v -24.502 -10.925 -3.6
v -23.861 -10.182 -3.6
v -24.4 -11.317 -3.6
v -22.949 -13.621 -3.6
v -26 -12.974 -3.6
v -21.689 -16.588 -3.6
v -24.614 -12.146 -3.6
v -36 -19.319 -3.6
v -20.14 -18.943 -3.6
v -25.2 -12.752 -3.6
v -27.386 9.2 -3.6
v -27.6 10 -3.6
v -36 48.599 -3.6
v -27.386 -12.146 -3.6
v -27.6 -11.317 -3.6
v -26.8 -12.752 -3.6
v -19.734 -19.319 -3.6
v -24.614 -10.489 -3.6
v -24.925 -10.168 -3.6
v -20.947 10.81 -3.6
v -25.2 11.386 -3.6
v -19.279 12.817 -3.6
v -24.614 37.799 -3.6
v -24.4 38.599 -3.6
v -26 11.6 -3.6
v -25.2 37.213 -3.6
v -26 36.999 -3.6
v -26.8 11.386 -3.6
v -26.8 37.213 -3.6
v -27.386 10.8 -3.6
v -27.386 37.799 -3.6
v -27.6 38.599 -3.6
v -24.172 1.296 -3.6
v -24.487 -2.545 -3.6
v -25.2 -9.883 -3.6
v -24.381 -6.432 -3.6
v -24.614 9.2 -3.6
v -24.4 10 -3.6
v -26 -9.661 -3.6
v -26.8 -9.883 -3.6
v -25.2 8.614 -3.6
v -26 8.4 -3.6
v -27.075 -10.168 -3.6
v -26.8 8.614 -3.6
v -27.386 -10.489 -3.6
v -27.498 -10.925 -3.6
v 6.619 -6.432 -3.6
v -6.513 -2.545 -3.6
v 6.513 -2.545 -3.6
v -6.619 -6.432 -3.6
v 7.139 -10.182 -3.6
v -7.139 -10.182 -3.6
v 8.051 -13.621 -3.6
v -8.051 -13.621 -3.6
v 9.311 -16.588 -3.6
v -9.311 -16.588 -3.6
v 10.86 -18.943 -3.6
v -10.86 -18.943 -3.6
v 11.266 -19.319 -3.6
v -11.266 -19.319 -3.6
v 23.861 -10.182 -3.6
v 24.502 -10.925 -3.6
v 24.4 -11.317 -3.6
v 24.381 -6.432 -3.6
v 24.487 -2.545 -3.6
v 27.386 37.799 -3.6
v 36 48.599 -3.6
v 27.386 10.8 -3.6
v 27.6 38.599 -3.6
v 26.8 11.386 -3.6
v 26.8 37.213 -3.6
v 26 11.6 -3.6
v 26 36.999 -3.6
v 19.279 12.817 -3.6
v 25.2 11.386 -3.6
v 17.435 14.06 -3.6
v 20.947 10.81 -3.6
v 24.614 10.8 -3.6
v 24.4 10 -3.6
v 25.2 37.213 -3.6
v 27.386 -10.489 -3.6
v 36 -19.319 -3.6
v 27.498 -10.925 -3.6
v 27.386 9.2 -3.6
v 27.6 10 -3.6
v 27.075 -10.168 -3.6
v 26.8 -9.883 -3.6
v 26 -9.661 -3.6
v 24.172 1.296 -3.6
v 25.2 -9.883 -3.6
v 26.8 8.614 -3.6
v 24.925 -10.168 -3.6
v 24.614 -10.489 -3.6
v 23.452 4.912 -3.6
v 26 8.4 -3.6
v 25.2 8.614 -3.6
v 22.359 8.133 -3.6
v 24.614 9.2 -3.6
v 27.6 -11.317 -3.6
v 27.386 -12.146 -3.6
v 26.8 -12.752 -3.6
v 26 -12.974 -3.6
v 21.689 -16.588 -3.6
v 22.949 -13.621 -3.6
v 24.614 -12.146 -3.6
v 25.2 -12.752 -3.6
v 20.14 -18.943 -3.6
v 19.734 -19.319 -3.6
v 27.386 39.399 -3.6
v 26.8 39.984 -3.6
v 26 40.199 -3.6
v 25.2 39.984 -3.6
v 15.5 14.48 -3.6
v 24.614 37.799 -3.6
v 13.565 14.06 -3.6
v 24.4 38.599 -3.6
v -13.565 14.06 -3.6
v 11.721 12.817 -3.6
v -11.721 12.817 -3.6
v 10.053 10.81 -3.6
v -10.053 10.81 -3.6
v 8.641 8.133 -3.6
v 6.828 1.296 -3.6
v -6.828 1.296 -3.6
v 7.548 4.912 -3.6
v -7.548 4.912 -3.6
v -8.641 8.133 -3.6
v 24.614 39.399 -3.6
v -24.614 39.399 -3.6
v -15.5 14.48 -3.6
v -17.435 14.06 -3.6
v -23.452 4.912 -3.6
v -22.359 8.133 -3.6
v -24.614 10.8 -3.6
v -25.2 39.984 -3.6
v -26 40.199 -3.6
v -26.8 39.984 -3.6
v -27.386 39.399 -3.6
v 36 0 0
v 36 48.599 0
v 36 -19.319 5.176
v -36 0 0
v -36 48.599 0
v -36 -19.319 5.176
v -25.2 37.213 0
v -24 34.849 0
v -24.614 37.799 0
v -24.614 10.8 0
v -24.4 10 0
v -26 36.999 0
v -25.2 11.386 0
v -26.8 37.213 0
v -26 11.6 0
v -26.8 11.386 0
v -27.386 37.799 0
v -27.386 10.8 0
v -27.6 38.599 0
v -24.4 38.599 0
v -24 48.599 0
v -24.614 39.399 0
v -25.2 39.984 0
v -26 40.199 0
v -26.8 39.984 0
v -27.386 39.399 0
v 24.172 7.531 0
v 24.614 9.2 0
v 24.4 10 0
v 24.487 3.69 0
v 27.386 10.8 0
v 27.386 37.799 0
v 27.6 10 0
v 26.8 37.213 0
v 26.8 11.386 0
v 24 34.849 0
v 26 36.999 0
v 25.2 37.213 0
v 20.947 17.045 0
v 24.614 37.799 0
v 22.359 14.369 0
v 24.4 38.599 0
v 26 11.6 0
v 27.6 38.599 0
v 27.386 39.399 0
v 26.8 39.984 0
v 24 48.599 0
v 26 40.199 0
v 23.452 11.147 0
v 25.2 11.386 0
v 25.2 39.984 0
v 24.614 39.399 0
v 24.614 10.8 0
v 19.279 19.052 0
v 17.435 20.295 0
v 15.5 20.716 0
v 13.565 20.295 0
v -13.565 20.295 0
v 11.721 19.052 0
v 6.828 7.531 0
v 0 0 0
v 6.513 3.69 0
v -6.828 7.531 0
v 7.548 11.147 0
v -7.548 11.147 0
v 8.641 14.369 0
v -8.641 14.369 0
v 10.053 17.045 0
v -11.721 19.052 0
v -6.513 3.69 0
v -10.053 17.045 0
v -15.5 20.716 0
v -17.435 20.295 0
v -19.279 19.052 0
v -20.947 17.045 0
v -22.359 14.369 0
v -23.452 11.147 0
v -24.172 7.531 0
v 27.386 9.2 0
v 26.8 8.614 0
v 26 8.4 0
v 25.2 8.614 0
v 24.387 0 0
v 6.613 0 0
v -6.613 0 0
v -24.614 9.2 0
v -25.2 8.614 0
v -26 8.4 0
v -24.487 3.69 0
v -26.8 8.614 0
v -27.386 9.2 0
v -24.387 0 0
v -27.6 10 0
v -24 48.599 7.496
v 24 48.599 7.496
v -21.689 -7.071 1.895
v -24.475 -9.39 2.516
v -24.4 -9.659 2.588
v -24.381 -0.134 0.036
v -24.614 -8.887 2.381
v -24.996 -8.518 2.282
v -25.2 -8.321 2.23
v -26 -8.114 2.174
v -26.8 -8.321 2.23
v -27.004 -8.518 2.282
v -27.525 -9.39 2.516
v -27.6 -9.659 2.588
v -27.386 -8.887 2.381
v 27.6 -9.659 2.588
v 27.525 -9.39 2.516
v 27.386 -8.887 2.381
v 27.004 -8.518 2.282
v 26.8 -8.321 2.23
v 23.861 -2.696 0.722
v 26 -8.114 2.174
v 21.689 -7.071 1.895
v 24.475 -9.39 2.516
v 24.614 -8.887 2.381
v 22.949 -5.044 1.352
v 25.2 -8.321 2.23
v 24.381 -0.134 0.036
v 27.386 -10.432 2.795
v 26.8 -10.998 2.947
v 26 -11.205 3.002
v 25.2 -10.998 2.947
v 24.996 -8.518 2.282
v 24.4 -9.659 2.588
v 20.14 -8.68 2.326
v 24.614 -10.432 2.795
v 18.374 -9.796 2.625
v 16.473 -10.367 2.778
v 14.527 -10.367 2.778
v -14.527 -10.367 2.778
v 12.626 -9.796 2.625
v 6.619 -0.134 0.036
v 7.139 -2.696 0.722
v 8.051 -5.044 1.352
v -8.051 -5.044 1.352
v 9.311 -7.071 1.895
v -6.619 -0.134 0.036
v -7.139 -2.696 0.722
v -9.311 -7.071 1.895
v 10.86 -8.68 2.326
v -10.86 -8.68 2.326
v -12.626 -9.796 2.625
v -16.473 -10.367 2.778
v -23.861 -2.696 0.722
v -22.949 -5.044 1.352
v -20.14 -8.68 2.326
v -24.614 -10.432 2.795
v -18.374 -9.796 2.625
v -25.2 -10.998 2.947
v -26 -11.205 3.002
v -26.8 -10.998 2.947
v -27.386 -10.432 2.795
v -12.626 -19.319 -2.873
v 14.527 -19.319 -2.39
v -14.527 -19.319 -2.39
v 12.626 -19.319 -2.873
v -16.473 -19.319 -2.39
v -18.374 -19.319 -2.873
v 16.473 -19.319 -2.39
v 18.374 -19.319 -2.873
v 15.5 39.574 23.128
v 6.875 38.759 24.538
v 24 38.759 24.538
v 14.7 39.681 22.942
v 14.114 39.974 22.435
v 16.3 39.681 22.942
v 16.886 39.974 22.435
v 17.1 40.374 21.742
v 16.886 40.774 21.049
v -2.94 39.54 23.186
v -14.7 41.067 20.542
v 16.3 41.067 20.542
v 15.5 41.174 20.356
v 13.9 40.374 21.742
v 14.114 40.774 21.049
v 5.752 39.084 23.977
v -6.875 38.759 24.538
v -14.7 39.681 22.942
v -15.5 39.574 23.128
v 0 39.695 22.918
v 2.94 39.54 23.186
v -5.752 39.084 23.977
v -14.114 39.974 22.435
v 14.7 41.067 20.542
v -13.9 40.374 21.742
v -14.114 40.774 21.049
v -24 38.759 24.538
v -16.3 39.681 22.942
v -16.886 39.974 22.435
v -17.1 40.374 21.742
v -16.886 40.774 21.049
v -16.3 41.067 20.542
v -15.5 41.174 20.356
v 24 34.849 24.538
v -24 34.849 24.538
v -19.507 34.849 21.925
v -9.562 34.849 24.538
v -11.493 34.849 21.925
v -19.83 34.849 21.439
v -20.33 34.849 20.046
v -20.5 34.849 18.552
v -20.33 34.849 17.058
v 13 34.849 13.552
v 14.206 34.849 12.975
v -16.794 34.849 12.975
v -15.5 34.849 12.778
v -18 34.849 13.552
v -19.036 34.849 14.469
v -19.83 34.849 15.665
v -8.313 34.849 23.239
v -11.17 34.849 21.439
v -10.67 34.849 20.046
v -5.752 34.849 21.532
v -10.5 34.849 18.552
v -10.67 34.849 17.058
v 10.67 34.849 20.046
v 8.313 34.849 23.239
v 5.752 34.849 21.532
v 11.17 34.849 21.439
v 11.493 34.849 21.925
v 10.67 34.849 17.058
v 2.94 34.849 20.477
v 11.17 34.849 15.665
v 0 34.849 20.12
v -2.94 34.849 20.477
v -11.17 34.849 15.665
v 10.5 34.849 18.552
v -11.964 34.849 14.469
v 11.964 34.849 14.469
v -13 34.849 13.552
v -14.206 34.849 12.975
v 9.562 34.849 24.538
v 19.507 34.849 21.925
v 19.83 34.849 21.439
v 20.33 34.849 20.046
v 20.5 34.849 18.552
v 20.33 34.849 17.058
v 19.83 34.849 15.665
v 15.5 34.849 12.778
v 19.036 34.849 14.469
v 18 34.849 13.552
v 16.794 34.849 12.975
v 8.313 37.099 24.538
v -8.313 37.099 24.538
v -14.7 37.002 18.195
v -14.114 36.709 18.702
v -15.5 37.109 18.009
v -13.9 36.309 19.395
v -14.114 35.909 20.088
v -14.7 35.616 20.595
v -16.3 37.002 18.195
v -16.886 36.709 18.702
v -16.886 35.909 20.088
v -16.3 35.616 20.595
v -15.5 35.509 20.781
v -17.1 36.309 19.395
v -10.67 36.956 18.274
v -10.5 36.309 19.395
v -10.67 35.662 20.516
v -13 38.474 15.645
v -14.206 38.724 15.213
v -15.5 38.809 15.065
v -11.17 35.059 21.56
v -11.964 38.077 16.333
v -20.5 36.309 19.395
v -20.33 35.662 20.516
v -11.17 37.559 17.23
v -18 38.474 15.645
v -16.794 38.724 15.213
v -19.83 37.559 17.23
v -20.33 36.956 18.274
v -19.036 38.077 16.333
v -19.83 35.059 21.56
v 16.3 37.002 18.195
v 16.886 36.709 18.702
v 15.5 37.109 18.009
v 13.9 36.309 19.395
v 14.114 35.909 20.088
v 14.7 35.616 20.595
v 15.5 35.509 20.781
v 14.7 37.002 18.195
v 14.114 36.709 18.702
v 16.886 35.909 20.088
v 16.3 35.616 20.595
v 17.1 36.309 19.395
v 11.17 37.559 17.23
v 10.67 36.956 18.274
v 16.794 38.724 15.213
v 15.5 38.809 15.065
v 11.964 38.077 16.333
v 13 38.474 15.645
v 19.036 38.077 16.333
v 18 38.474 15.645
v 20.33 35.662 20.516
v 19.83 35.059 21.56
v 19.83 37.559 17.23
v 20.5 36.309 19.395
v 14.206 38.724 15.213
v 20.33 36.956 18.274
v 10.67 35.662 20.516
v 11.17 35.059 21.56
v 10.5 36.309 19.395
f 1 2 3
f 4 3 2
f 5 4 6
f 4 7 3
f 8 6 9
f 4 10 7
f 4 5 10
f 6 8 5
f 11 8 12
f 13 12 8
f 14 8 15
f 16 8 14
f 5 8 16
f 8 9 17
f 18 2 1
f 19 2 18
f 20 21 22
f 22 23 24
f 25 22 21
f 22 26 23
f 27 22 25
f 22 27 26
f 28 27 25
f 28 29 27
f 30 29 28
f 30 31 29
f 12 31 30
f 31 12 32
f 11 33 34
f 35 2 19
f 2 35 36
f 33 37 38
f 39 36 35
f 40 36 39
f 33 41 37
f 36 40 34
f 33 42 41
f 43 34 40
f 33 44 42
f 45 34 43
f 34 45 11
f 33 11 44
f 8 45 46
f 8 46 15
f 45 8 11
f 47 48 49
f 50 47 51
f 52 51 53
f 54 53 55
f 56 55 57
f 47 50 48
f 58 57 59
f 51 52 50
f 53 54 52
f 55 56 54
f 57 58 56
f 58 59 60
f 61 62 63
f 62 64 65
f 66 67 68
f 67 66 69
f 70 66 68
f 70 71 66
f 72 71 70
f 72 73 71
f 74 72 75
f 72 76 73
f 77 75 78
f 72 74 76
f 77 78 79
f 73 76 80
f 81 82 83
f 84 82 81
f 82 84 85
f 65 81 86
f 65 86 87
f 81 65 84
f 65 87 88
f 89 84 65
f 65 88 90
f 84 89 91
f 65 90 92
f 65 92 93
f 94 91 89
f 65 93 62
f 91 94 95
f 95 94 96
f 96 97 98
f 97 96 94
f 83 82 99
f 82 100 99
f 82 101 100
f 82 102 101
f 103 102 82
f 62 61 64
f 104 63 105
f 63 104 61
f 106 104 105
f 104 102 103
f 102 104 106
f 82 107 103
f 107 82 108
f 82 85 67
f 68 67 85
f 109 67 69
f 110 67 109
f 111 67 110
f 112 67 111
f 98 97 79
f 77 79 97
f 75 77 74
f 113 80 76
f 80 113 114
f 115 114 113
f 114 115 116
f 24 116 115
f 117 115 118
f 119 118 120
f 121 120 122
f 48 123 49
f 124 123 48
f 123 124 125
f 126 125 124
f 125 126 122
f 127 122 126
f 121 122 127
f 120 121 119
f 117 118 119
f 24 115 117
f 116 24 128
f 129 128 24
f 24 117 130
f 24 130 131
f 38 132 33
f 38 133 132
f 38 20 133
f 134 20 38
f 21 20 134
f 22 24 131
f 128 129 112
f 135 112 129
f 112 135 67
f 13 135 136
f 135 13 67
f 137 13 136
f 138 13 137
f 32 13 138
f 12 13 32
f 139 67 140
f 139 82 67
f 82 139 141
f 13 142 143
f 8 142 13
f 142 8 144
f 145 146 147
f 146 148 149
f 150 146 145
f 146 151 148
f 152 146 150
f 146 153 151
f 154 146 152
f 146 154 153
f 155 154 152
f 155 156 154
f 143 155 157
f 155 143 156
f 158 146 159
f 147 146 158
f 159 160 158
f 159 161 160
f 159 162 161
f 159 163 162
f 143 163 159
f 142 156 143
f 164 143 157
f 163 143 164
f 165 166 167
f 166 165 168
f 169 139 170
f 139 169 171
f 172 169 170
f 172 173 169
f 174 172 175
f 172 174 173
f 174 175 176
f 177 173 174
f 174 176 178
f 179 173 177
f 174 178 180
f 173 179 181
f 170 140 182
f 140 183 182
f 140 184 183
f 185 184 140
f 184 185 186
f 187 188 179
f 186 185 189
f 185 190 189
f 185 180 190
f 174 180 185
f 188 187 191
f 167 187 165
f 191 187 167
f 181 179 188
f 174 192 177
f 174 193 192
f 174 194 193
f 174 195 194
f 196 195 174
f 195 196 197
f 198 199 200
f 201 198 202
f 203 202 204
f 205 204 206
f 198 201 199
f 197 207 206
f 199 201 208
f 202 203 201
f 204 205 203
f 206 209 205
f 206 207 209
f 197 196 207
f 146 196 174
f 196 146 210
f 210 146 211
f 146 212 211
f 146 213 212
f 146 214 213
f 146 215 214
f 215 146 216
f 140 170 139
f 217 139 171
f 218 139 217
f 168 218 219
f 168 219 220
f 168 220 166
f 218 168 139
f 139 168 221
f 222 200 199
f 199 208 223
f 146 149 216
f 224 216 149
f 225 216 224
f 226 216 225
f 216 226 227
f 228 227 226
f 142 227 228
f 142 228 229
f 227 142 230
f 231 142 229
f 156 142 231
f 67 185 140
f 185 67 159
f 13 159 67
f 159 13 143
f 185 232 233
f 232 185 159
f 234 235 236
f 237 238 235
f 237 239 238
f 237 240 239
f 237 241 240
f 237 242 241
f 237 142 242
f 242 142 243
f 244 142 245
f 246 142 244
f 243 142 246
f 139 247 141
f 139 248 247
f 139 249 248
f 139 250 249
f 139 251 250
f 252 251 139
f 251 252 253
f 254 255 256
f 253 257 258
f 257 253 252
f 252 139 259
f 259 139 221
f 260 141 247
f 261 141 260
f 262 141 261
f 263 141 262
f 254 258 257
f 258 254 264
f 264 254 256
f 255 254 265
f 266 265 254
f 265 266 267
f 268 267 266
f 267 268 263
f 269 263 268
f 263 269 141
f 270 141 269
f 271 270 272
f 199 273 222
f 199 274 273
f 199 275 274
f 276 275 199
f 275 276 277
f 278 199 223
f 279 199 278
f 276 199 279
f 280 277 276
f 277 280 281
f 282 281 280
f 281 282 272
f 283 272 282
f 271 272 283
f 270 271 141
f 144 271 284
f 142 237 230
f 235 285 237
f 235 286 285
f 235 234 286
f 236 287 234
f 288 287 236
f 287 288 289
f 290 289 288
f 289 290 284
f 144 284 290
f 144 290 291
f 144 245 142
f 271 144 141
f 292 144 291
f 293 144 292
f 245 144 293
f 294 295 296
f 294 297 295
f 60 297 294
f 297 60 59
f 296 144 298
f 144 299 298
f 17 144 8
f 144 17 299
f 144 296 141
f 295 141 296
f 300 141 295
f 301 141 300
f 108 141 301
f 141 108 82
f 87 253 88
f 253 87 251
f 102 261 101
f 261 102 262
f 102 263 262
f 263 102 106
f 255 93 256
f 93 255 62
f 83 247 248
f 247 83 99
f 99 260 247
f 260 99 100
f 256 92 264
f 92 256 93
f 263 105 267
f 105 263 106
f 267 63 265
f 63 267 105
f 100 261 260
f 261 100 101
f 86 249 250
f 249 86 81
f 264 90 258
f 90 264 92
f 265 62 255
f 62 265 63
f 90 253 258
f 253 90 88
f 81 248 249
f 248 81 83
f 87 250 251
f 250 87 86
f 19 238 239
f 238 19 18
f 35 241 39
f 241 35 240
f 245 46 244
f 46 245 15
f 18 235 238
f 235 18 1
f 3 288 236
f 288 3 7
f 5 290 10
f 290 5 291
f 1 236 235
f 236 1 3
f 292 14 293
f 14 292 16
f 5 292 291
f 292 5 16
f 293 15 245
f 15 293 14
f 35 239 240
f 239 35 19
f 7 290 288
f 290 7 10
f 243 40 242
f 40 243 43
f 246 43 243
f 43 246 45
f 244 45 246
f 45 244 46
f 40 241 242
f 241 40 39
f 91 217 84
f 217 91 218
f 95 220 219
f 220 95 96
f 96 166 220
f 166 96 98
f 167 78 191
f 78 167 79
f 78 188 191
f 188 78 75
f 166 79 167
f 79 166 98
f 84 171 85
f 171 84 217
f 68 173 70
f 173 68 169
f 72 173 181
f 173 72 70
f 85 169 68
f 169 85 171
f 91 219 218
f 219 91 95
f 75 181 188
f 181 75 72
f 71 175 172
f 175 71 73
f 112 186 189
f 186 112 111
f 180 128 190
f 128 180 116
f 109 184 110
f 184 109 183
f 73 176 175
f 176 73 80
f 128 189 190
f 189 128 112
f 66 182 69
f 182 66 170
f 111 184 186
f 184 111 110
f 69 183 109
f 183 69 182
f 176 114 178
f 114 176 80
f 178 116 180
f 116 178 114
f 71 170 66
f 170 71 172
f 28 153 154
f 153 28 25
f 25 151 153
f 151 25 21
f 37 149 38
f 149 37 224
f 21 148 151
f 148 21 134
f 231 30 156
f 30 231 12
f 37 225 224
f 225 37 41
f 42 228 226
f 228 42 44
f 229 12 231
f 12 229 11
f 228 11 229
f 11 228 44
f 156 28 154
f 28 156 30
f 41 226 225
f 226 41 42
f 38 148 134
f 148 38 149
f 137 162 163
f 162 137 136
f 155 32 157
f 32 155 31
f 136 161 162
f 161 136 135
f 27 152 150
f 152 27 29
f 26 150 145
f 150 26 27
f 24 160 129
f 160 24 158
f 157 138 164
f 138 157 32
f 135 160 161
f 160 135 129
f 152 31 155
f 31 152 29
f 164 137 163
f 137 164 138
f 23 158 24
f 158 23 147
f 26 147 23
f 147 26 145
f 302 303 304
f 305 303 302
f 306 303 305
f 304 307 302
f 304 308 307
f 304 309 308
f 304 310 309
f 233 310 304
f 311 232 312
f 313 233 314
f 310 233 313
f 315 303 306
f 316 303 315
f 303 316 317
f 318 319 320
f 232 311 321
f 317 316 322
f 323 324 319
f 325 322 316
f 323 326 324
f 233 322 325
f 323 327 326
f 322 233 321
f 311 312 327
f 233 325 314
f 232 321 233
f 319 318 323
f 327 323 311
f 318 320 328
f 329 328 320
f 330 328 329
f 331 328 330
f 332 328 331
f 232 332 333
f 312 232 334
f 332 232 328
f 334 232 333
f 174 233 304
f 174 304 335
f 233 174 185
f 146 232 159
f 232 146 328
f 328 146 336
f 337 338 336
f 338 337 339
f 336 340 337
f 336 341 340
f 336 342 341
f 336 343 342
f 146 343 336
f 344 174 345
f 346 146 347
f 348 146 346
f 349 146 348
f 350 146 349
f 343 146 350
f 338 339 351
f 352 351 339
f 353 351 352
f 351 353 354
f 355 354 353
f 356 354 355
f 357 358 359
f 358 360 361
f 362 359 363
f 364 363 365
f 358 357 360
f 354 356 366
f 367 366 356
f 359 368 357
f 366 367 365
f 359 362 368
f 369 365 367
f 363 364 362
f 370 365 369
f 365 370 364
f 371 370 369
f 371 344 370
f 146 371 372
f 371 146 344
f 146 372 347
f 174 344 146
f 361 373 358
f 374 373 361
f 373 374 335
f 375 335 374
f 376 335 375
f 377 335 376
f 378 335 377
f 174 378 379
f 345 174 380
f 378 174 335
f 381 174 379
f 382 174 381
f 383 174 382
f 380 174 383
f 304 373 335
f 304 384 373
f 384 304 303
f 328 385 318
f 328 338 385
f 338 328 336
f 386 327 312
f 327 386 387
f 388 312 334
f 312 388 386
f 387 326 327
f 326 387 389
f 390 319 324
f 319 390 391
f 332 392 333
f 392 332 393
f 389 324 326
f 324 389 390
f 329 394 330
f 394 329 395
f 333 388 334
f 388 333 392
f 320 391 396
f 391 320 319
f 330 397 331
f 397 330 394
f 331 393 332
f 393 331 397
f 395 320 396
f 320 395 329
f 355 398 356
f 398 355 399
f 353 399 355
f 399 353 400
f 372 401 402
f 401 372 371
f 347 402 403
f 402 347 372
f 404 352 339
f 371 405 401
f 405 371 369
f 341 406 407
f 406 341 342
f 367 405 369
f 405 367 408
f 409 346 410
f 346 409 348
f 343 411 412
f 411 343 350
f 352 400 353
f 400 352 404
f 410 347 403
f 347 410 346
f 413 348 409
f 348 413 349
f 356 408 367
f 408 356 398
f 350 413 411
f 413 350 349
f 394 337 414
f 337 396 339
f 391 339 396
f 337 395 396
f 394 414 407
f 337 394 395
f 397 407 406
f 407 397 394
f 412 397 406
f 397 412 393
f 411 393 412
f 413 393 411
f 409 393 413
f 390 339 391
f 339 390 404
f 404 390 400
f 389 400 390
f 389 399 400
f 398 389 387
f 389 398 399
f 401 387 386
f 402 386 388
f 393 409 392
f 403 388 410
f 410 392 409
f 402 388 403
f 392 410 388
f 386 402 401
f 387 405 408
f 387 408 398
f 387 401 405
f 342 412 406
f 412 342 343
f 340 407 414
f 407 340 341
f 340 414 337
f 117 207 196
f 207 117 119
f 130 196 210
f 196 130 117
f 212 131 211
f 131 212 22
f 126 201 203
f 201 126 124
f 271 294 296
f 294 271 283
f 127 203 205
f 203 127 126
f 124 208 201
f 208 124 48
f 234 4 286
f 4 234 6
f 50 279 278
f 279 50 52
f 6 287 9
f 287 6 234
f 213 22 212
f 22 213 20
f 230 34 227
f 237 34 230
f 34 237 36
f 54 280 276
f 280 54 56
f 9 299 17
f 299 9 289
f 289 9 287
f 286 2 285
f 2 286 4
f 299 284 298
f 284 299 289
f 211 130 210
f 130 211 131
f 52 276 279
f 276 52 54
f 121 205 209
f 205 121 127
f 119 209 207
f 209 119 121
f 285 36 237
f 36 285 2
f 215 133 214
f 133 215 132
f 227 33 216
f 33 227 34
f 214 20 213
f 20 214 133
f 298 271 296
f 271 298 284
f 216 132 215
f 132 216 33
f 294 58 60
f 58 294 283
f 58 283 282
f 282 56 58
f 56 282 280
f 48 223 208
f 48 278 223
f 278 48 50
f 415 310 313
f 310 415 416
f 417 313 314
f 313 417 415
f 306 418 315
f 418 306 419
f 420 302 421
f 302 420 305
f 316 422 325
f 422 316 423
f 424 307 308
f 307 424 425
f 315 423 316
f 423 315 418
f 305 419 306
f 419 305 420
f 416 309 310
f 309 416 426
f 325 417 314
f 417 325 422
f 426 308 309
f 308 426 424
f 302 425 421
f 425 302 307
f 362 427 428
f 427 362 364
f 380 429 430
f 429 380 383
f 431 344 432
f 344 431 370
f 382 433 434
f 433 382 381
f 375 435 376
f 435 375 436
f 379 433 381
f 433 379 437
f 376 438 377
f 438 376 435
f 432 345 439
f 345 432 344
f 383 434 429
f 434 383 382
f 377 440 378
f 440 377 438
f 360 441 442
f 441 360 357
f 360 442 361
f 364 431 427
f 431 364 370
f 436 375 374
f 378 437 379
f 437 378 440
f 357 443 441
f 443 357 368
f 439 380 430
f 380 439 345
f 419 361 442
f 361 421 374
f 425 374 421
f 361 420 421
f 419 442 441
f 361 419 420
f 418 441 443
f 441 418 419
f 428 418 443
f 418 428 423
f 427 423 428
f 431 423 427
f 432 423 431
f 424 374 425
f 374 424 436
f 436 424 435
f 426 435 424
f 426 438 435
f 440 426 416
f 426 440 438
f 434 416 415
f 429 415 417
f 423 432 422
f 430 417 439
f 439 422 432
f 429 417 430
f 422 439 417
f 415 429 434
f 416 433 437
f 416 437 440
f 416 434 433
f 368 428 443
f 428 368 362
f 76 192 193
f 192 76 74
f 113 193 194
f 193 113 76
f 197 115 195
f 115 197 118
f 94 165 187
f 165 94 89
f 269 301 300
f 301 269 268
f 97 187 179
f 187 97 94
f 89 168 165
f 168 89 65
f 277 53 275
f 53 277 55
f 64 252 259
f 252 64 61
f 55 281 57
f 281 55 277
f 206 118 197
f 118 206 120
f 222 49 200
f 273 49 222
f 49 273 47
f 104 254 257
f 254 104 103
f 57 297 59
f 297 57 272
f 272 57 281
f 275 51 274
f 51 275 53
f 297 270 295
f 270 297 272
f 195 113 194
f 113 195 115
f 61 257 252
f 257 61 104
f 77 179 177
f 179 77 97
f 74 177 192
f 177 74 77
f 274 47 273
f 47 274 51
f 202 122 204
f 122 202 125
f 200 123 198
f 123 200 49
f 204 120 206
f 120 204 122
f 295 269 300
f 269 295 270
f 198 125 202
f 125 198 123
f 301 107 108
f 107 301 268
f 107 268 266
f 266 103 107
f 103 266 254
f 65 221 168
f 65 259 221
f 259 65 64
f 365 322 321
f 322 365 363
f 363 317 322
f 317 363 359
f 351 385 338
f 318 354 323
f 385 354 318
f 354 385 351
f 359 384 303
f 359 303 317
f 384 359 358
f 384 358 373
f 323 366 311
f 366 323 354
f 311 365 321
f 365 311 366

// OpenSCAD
// file: libraries/frame_axis_block.scad
// extr=20; h = 3*extr; w = h; diagonal = extr*sqrt(2); thickness=3.6; 
 

module frame_axis_block(h, w, thickness, extr, diagonal) {
  difference() {
    intersection() {
      //rotate([0, 0, -30])
       translate([-extr*sin(15), -extr*cos(15), -h/2], center=false)
	        cube([extr*sin(15)+thickness, w, h]);
      union() {
	      translate([0,-extr*cos(15), -h/2]) 
      //   rotate([0, 0, -30])
	          cube([thickness, w, h]); //main frame plate
	    //  rotate([0, 0, -45])
        translate([-extr*sin(15), -extr*cos(15), -h/2])
          rotate([0,0,-15])
	          cube([extr, extr, h], center=false); //15degr extr cutout
      }
    } 
    
    
      // Vertical OpenBeam mounting screw holes.
       # for (z=[h/2-extr/2, -h/2+extr/2]) {
          translate([0, 0, z]) 
            rotate([90, 0, 75])
              translate([-extr/2, 0, extr/2*sin(15)+5]) {
                 cylinder(r=1.6, h=50, $fn=12, center=true);
                // cylinder(r=2.8, h=3, $fn=12, center=true);
        }
      }
    // Horizontal OpenBeam mounting screw holes.
       for (z= [h/2-extr/2, -h/2+extr/2]){
       for (y = [extr/2, w-extr*cos(15)-extr/2]) {
           translate([0, y, z])
             rotate([0, 90, 0])
               cylinder(r=1.6, h=10, $fn=12, center=true);
       }
      }  
    
}
}
//
// scale([1, 1, 1]) rotate([0, 90, 90]) rotate([0, 0, 30]) 
//{ frame_axis_block(h, w, thickness, extr, diagonal);
//    translate([-extr*sin(15), -extr*cos(15), -h]) rotate([0, 0, 75]) % cube([extr, extr, 1000], center=false);
//   }
// file: configuration.scad
// OD = outside diameter, corner to corner.
m3_nut_od = 6.1;
m3_nut_radius = (m3_nut_od+0.2)/2;

// Major diameter of metric 3mm thread.
m3_major = 2.85;
m3_radius = m3_major/2;
m3_open_radius = 3.2/2;
m3_cap=4;
m3_clr=0.2;

// NEMA17 stepper motors.
motor_d=48;
motor_shaft_diameter = 5;
motor_shaft_radius = (motor_shaft_diameter+0.3)/2;

//frame motor dimm
motor_screws = 31; // mm center-to-center
motor_width = 42.5; // mm total motor face width
motor_height = 15; // mm bracket height
motor_length = 12; // mm bracket length
motor_screws_height = (motor_width - motor_screws) / 2;
motor_shaft = 30; // mm from motor face to OpenBeam center
motor_thickness = 5; // mm bracket thickness
//height = 2*extr + motor_width;
//diagonal = extr*sqrt(2);
motor_offset = motor_shaft+2;

// Frame brackets.
thickness = 3.6;

// extrusion dimmensions
extr = 20; //15 - 20 for 20x20 extrusion
extr_tslot = 6.8; //3.2 6.8 for 20x20 extrusion
extr_nut = 11; //5.8 11 for 20x20 extrusion
extr_corn = (extr - extr_tslot)/2;
diagonal=extr*sqrt(2);

clear = 0.4;

// motor offset change 24mm - pulley size +2mm offset
//if (motor_shaft < 24) {
  //motor_offset = 24 ;
  //}
  //else  {motor_offset = 24;
  //}

//dimmensions calculations for frame_motor (some trigonometry)

f1= (extr*sin(15)+thickness)/cos(30);
f2=(extr*sin(15)+thickness)*cos(60)/sin(60);
L=f1+diagonal+motor_offset;
f4=L*sin(30)/cos(30)-motor_d/2;
f3=f4/2;
w_fm = L/cos(30)-f3-f2;

//motor cut_off frame
h_mot_cut_off = L*sin(30) - (motor_screws - motor_d/2)*cos(30);
// main file
include <configuration.scad>;
use <libraries/frame_axis_block.scad>

//extr=25;
h = 2*extr/2+motor_d+m3_cap;
w = w_fm;
//diagonal = extr*sqrt(2);

module frame_motor() {
  difference() {
   
 //  intersection() {translate([-h, -h/2, -h/2]) rotate([0, 0, -30]) translate([0, 0, 0]) #cube([22, h , w]);}
    union() {
      rotate([0,0,-0])
        frame_axis_block(h, w, thickness, extr, diagonal);
	      intersection() {
          translate([0, w-extr*(cos(15)+1/5)+f3-L*sin(30)*tan(30), -motor_d/2])
          //translate([0, w-extr*(cos(15)+1/2), -motor_d/2])
	          rotate([0, 0, 60])
	           cylinder(r=L*sin(30), h=motor_d, $fn=3, center=false);
	        //rotate([0, 0, -30]) 
          translate([thickness, w-extr*cos(15), -motor_d/2]) 
             scale([-1,-1,1])
              cube([L*sin(30)-diagonal/4, extr/2+motor_thickness*3/4, motor_d], center=false);
             // translate([-h_mot_cut_off/2+thickness, w-extr*(cos(15)+1/2), 0]) 
             //cube([h_mot_cut_off, extr, motor_d], center=true);
  	      }
    }
	//rotate([0, 0, 135]) translate([-0, 0, -h])	%cube([extr, extr, h*2], center=false);
    rotate([0,0,30]){
    // Motor center cutout.
      scale([1,-1,1])
        translate([-diagonal/2, 0, 0]) 
          rotate([90, 0, 0])
            cylinder(r=diagonal/2, h=L-f1-diagonal/2, center=false);
    // Motor mounting screw holes.
      for (z = [-1, 1]) {
       # translate([-diagonal/2+motor_screws/2, L-f1-diagonal/2, z*motor_screws/2])
	        rotate([90, 0, 0])
	          cylinder(r=1.6, h=100, center=false, $fn=12);
        translate([motor_screws/2-diagonal/2, L-f1-diagonal/2-motor_thickness, z*motor_screws/2])
	        rotate([90, 0, 0])
	          cylinder(r=5, h=20, center=false, $fn=24);
        #translate([motor_screws/2-diagonal/2, extr, z*motor_screws/2])
	        rotate([90, 0, 0])
	          cylinder(r=9, h=extr*4, center=false);
       
      }
    }
   //  #translate([extr/4, w, 0])
     //     rotate([90, 0, -10])
       //     cylinder(r=extr/3, h=extr*6, center=false);
  }
}

translate([0, 0, 0])
rotate([0, 90, 0])
//rotate([0, 0, 30])
frame_motor();
// scale([-1, 1, 1]) frame_motor();

// OpenBeam.
// % rotate([0, 0, 45]) cube([extr, extr, 100], center=true);

// NEMA17 stepper motor.
// translate([0, motor_offset+30, 0])
// % cube([motor_width, 60, motor_width], center=true);
